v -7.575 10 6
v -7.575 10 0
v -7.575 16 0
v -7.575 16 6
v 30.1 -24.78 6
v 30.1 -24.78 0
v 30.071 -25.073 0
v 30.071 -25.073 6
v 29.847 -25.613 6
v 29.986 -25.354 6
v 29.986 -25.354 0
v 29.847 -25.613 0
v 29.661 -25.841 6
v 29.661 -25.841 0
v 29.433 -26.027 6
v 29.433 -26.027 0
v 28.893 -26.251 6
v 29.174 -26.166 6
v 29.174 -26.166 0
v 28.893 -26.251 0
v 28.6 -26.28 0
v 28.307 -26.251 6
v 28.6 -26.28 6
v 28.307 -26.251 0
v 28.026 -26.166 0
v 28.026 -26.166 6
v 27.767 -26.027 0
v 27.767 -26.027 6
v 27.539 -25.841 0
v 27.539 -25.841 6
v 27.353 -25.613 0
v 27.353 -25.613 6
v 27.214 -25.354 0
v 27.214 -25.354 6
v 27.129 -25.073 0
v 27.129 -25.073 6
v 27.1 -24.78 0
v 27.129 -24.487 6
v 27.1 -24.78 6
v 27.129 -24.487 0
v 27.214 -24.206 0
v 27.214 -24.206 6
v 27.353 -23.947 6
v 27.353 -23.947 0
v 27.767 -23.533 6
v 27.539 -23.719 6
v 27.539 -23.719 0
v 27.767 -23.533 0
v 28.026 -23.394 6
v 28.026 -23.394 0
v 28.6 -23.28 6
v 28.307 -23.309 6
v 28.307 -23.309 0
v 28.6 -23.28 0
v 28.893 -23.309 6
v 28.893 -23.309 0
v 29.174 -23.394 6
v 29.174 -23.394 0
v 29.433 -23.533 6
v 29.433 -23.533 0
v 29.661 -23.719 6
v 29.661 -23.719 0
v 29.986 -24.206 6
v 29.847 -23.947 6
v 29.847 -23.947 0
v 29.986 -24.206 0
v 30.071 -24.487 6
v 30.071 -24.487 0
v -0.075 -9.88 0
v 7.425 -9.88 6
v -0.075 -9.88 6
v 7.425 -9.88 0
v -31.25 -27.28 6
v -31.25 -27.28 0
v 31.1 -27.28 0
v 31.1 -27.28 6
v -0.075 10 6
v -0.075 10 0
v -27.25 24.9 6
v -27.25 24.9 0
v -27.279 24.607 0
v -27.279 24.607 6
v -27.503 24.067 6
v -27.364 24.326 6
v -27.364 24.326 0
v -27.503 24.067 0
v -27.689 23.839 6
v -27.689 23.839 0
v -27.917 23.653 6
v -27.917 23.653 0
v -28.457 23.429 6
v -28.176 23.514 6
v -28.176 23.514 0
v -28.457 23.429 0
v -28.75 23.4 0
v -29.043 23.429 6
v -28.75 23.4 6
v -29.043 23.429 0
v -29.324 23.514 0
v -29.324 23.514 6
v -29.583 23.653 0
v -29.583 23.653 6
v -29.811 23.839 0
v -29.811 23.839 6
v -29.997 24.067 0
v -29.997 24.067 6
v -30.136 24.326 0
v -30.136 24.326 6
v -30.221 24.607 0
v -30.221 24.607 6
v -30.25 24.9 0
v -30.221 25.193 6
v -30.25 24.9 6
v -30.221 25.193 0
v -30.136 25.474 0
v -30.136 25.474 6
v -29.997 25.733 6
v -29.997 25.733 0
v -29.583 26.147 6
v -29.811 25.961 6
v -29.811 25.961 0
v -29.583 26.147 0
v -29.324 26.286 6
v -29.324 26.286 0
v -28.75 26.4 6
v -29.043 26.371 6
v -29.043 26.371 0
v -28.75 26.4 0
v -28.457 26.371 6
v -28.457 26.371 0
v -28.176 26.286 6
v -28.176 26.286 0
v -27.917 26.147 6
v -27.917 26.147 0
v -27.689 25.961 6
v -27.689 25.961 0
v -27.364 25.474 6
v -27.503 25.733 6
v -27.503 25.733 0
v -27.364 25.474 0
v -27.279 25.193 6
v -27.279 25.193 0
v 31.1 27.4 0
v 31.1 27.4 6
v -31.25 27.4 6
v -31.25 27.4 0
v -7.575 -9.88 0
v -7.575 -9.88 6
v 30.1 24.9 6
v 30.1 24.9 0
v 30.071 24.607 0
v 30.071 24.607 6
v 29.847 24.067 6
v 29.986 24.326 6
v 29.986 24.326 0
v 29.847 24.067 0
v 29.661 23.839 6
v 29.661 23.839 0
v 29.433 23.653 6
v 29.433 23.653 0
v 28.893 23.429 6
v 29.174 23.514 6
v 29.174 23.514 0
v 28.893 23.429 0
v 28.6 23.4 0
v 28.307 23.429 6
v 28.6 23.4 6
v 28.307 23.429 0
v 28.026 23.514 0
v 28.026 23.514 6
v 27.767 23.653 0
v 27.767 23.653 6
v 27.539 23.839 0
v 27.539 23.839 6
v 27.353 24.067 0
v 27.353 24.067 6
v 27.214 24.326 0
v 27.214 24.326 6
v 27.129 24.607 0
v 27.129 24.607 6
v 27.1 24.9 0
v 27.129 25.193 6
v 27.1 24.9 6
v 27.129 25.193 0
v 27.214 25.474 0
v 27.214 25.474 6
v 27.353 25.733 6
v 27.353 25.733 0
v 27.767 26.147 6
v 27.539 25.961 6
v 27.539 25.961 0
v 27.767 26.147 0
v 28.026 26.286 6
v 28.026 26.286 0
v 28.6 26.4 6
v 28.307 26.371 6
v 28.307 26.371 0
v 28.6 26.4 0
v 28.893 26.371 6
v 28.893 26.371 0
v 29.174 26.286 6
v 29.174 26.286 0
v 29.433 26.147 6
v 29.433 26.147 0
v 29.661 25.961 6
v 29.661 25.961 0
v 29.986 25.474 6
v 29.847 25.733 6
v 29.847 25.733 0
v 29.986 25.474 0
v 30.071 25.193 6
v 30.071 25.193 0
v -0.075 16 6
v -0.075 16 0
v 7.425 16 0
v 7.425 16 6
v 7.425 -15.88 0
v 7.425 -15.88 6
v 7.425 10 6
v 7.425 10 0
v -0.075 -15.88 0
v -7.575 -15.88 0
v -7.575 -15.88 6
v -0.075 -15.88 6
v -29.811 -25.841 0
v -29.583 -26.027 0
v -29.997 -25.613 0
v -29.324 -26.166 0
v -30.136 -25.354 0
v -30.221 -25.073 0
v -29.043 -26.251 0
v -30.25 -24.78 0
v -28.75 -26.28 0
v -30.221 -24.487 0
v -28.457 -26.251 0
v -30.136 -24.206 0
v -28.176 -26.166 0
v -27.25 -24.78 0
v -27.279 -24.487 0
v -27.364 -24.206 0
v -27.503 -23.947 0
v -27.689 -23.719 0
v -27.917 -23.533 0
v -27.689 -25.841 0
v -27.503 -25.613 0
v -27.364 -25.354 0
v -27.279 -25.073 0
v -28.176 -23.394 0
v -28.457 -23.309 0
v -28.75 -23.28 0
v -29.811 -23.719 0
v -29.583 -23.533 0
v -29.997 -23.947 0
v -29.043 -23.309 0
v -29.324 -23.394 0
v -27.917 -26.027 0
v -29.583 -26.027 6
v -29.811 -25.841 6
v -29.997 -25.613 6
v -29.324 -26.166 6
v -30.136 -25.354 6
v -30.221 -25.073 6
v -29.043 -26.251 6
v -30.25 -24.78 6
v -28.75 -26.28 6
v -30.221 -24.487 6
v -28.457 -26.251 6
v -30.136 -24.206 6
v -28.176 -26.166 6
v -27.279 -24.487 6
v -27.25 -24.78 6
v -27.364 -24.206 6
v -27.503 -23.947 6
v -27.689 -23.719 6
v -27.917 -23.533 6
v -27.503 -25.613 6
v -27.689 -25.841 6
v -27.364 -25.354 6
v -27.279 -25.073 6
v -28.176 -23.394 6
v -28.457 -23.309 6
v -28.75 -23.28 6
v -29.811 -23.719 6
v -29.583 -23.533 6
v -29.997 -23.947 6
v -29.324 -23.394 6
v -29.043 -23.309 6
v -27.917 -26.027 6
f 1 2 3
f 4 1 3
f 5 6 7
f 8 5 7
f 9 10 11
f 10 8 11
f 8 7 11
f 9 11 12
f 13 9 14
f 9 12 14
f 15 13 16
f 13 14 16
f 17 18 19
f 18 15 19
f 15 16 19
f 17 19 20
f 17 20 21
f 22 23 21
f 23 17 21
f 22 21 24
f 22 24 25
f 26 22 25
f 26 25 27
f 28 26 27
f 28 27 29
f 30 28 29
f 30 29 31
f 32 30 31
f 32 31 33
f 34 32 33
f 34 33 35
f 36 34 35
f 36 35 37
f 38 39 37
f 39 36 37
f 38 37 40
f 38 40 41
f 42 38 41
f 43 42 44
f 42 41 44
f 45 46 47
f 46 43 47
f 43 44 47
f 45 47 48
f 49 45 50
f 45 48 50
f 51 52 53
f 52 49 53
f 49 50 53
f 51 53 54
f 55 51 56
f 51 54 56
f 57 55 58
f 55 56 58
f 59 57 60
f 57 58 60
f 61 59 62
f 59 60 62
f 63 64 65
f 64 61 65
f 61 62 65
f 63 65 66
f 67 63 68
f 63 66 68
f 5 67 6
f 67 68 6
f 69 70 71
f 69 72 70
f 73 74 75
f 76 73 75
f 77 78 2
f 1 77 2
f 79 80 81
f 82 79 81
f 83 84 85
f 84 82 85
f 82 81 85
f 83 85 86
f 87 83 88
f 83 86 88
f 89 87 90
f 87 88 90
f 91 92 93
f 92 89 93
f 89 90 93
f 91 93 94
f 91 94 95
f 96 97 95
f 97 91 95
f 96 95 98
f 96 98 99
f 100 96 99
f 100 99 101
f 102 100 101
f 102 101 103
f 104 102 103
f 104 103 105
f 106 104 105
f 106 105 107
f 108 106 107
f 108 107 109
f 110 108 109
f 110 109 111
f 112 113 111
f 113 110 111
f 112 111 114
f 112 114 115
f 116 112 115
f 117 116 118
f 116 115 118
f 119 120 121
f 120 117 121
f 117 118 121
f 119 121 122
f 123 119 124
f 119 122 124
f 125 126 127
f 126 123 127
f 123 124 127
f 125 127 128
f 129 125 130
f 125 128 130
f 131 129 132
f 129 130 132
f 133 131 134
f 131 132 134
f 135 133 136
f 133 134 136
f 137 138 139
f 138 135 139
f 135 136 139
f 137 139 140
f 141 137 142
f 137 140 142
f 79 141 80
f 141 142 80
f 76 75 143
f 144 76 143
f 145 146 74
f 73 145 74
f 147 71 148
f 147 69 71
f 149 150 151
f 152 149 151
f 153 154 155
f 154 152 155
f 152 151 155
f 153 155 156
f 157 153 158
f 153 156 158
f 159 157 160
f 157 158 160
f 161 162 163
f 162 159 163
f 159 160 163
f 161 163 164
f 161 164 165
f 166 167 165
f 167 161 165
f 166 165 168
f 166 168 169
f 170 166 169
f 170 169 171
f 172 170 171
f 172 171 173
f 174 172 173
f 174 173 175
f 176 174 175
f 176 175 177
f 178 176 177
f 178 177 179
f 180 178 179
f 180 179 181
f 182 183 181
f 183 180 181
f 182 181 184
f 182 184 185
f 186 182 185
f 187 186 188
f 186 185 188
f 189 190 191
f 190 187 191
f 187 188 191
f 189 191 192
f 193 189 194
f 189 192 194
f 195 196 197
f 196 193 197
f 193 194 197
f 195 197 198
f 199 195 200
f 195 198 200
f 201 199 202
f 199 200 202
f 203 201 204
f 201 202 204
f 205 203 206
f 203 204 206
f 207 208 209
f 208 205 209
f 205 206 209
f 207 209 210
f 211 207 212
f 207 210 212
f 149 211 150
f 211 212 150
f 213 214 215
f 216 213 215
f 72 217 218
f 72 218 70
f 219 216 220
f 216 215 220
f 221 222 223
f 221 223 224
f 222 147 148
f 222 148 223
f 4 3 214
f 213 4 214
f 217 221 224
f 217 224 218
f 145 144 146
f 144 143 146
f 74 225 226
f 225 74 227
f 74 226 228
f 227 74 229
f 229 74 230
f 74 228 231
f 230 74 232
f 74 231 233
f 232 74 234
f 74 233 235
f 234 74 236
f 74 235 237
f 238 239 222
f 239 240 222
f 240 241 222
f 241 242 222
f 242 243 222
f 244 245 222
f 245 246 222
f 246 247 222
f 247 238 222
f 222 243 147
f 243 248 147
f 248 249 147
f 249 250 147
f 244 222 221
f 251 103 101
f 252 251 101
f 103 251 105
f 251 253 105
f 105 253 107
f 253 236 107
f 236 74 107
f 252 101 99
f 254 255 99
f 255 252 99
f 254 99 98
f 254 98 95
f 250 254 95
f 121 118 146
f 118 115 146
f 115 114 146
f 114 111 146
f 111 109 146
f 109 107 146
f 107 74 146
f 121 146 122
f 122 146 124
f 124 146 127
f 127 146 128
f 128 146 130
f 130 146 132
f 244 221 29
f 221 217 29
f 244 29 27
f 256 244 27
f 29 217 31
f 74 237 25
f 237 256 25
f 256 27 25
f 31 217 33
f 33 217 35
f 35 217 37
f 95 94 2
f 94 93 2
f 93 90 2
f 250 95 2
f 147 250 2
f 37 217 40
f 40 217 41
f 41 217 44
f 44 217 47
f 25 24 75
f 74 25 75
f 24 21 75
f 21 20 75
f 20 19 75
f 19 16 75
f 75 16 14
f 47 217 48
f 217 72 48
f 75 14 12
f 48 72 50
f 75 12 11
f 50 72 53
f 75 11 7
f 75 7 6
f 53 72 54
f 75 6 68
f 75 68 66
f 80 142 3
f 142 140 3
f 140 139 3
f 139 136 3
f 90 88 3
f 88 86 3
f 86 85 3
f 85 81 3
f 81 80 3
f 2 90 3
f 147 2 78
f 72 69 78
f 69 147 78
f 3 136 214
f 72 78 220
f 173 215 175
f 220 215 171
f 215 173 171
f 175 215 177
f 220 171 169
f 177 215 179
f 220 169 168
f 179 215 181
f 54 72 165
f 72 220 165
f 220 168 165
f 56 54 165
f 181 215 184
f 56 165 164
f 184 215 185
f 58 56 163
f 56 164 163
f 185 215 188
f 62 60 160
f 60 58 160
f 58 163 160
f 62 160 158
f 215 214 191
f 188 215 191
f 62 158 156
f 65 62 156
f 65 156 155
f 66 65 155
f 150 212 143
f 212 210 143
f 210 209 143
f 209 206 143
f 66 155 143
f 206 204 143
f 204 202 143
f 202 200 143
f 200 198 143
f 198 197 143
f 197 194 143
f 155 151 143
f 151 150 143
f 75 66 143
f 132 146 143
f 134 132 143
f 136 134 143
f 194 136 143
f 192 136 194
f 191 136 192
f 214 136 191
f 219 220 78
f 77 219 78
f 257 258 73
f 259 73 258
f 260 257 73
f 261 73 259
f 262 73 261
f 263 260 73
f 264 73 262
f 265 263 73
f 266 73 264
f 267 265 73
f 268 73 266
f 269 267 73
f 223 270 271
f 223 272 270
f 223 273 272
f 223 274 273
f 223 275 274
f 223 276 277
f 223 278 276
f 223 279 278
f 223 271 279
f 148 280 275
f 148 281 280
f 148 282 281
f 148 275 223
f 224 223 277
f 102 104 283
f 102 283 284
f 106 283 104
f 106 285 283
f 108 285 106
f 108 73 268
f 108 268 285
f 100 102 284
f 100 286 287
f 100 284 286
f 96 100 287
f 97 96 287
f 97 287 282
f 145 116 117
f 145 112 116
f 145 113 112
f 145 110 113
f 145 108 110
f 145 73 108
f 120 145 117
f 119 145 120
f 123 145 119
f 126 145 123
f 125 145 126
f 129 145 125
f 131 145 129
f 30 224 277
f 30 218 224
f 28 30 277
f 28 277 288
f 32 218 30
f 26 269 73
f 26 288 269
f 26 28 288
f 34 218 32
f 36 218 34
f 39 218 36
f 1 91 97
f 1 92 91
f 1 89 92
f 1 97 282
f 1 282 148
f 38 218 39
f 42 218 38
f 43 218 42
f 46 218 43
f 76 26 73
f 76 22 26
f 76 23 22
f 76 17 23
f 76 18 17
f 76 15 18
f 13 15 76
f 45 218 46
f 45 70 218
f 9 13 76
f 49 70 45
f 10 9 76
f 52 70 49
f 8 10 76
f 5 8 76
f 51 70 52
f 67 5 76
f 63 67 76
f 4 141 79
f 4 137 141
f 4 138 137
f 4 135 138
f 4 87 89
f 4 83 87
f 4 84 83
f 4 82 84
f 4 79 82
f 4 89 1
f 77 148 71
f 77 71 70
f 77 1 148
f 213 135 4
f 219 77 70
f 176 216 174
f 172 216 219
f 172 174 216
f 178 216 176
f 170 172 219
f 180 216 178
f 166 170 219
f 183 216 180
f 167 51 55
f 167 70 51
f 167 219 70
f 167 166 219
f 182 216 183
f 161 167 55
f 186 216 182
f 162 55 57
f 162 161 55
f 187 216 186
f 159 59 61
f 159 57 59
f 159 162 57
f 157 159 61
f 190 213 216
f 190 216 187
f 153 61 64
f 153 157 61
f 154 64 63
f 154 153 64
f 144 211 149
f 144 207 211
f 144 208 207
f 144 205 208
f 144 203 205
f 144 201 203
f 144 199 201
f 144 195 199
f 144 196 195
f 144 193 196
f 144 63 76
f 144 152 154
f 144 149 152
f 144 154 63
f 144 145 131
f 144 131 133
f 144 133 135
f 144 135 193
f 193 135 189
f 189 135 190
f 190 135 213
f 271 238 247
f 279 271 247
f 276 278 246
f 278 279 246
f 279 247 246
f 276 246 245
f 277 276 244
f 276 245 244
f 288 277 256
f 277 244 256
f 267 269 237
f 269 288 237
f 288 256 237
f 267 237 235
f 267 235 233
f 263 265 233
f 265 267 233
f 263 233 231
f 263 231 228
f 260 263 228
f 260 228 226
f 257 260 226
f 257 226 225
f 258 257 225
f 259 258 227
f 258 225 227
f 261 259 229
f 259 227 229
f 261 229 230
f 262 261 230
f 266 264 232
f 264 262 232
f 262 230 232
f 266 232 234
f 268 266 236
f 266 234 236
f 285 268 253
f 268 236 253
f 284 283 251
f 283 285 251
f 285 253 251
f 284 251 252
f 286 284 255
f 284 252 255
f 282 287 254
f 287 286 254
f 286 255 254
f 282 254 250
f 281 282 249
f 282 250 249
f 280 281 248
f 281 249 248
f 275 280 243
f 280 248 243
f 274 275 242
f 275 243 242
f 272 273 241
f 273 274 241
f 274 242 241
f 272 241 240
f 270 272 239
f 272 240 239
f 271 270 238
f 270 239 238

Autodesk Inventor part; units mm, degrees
ref_plane "YZ Plane" through (0, 0, 0) normal (1, 0, 0) x (0, 1, 0)
ref_plane "XZ Plane" through (0, 0, 0) normal (0, 1, 0) x (-1, 0, 0)
ref_plane "XY Plane" through (0, 0, 0) normal (0, 0, 1) x (1, 0, 0)
sketch "Esquisse1" plane through (0, 0, 0) normal (0, 0, 1) x (1, 0, 0)
  circle A0 centre (28.6, 24.9) radius 1.5 projected
  circle A1 centre (28.6, -24.78) radius 1.5 projected
  circle A2 centre (-28.75, 24.9) radius 1.5 projected
  circle A3 centre (-28.75, -24.78) radius 1.5 projected
  line L0 (31.1, 27.4) -> (-31.25, 27.4) projected
  line L1 (-31.25, 27.4) -> (-31.25, -27.28) projected
  line L2 (-31.25, -27.28) -> (31.1, -27.28) projected
  line L3 (31.1, -27.28) -> (31.1, 27.4) projected
  line L4 (-7.575, 16) -> (-0.075, 16)
  line L5 (-0.075, 16) -> (7.425, 16)
  line L6 (7.425, 16) -> (7.425, 10)
  line L7 (7.425, 10) -> (-0.075, 10)
  line L8 (-0.075, 10) -> (-7.575, 10)
  line L9 (-7.575, 10) -> (-7.575, 16)
  line L10 (-0.075, 37.051) -> (-0.075, -38.1524) construction
  line L11 (34.7968, 0.06) -> (-21.7073, 0.06) construction
  line L12 (-7.575, -15.88) -> (-0.075, -15.88)
  line L13 (-0.075, -15.88) -> (7.425, -15.88)
  line L14 (7.425, -15.88) -> (7.425, -9.88)
  line L15 (7.425, -9.88) -> (-0.075, -9.88)
  line L16 (-0.075, -9.88) -> (-7.575, -9.88)
  line L17 (-7.575, -9.88) -> (-7.575, -15.88)
  line L18 (-0.075, -36.931) -> (-0.075, 38.2724) construction
  point P0 (0, 0)
  point P1 (-0.075, 27.4)
  point P2 (31.1, 0.06)
  dimension "d0" = 7.5
  dimension "d1" = 16
  dimension "d2" = 6
extrude "Extrusion1" add sketch "Esquisse1" along normal blind 6
equation "\"d0\" = 0.5 * L_attache_carte"
equation "\"d1\" = 0.5 * largeur"
equation "\"d2\" = epaisseur"
equation "\"d3\" = epaisseur"
equation "\"epaisseur\" = 6"
equation "\"ecartement\" = 25"
equation "\"dvis\" = 3"
equation "\"largeur\" = 32"
equation "\"L_attache_carte\" = 15"
equation "\"marge_attache_carte\" = 5"
equation "\"L_cubi\" = 81.6"
equation "\"taille_trou\" = 7"
equation "\"L_moteur\" = 28.3"
equation "\"marge_trou\" = 2"
equation "\"largeur_cubi\" = 81.6"
equation "\"H_cubi\" = 81.6"
equation "\"epaisseur_wheel\" = 9"
equation "\"H_nez\" = 25"
equation "\"chanfrein\" = 0.5"
equation "\"H_trou_int\" = 0.2"
equation "\"L_trou_int\" = 1"
equation "\"pos_trou_int_1\" = 0.7"
equation "\"pos_trou_int_2\" = 3"
equation "\"epaisseur_metabois\" = 3"
equation "\"L_metabois\" = 8.2"
equation "\"epaisseur_modules\" = 6"
properties part number "support_card"
